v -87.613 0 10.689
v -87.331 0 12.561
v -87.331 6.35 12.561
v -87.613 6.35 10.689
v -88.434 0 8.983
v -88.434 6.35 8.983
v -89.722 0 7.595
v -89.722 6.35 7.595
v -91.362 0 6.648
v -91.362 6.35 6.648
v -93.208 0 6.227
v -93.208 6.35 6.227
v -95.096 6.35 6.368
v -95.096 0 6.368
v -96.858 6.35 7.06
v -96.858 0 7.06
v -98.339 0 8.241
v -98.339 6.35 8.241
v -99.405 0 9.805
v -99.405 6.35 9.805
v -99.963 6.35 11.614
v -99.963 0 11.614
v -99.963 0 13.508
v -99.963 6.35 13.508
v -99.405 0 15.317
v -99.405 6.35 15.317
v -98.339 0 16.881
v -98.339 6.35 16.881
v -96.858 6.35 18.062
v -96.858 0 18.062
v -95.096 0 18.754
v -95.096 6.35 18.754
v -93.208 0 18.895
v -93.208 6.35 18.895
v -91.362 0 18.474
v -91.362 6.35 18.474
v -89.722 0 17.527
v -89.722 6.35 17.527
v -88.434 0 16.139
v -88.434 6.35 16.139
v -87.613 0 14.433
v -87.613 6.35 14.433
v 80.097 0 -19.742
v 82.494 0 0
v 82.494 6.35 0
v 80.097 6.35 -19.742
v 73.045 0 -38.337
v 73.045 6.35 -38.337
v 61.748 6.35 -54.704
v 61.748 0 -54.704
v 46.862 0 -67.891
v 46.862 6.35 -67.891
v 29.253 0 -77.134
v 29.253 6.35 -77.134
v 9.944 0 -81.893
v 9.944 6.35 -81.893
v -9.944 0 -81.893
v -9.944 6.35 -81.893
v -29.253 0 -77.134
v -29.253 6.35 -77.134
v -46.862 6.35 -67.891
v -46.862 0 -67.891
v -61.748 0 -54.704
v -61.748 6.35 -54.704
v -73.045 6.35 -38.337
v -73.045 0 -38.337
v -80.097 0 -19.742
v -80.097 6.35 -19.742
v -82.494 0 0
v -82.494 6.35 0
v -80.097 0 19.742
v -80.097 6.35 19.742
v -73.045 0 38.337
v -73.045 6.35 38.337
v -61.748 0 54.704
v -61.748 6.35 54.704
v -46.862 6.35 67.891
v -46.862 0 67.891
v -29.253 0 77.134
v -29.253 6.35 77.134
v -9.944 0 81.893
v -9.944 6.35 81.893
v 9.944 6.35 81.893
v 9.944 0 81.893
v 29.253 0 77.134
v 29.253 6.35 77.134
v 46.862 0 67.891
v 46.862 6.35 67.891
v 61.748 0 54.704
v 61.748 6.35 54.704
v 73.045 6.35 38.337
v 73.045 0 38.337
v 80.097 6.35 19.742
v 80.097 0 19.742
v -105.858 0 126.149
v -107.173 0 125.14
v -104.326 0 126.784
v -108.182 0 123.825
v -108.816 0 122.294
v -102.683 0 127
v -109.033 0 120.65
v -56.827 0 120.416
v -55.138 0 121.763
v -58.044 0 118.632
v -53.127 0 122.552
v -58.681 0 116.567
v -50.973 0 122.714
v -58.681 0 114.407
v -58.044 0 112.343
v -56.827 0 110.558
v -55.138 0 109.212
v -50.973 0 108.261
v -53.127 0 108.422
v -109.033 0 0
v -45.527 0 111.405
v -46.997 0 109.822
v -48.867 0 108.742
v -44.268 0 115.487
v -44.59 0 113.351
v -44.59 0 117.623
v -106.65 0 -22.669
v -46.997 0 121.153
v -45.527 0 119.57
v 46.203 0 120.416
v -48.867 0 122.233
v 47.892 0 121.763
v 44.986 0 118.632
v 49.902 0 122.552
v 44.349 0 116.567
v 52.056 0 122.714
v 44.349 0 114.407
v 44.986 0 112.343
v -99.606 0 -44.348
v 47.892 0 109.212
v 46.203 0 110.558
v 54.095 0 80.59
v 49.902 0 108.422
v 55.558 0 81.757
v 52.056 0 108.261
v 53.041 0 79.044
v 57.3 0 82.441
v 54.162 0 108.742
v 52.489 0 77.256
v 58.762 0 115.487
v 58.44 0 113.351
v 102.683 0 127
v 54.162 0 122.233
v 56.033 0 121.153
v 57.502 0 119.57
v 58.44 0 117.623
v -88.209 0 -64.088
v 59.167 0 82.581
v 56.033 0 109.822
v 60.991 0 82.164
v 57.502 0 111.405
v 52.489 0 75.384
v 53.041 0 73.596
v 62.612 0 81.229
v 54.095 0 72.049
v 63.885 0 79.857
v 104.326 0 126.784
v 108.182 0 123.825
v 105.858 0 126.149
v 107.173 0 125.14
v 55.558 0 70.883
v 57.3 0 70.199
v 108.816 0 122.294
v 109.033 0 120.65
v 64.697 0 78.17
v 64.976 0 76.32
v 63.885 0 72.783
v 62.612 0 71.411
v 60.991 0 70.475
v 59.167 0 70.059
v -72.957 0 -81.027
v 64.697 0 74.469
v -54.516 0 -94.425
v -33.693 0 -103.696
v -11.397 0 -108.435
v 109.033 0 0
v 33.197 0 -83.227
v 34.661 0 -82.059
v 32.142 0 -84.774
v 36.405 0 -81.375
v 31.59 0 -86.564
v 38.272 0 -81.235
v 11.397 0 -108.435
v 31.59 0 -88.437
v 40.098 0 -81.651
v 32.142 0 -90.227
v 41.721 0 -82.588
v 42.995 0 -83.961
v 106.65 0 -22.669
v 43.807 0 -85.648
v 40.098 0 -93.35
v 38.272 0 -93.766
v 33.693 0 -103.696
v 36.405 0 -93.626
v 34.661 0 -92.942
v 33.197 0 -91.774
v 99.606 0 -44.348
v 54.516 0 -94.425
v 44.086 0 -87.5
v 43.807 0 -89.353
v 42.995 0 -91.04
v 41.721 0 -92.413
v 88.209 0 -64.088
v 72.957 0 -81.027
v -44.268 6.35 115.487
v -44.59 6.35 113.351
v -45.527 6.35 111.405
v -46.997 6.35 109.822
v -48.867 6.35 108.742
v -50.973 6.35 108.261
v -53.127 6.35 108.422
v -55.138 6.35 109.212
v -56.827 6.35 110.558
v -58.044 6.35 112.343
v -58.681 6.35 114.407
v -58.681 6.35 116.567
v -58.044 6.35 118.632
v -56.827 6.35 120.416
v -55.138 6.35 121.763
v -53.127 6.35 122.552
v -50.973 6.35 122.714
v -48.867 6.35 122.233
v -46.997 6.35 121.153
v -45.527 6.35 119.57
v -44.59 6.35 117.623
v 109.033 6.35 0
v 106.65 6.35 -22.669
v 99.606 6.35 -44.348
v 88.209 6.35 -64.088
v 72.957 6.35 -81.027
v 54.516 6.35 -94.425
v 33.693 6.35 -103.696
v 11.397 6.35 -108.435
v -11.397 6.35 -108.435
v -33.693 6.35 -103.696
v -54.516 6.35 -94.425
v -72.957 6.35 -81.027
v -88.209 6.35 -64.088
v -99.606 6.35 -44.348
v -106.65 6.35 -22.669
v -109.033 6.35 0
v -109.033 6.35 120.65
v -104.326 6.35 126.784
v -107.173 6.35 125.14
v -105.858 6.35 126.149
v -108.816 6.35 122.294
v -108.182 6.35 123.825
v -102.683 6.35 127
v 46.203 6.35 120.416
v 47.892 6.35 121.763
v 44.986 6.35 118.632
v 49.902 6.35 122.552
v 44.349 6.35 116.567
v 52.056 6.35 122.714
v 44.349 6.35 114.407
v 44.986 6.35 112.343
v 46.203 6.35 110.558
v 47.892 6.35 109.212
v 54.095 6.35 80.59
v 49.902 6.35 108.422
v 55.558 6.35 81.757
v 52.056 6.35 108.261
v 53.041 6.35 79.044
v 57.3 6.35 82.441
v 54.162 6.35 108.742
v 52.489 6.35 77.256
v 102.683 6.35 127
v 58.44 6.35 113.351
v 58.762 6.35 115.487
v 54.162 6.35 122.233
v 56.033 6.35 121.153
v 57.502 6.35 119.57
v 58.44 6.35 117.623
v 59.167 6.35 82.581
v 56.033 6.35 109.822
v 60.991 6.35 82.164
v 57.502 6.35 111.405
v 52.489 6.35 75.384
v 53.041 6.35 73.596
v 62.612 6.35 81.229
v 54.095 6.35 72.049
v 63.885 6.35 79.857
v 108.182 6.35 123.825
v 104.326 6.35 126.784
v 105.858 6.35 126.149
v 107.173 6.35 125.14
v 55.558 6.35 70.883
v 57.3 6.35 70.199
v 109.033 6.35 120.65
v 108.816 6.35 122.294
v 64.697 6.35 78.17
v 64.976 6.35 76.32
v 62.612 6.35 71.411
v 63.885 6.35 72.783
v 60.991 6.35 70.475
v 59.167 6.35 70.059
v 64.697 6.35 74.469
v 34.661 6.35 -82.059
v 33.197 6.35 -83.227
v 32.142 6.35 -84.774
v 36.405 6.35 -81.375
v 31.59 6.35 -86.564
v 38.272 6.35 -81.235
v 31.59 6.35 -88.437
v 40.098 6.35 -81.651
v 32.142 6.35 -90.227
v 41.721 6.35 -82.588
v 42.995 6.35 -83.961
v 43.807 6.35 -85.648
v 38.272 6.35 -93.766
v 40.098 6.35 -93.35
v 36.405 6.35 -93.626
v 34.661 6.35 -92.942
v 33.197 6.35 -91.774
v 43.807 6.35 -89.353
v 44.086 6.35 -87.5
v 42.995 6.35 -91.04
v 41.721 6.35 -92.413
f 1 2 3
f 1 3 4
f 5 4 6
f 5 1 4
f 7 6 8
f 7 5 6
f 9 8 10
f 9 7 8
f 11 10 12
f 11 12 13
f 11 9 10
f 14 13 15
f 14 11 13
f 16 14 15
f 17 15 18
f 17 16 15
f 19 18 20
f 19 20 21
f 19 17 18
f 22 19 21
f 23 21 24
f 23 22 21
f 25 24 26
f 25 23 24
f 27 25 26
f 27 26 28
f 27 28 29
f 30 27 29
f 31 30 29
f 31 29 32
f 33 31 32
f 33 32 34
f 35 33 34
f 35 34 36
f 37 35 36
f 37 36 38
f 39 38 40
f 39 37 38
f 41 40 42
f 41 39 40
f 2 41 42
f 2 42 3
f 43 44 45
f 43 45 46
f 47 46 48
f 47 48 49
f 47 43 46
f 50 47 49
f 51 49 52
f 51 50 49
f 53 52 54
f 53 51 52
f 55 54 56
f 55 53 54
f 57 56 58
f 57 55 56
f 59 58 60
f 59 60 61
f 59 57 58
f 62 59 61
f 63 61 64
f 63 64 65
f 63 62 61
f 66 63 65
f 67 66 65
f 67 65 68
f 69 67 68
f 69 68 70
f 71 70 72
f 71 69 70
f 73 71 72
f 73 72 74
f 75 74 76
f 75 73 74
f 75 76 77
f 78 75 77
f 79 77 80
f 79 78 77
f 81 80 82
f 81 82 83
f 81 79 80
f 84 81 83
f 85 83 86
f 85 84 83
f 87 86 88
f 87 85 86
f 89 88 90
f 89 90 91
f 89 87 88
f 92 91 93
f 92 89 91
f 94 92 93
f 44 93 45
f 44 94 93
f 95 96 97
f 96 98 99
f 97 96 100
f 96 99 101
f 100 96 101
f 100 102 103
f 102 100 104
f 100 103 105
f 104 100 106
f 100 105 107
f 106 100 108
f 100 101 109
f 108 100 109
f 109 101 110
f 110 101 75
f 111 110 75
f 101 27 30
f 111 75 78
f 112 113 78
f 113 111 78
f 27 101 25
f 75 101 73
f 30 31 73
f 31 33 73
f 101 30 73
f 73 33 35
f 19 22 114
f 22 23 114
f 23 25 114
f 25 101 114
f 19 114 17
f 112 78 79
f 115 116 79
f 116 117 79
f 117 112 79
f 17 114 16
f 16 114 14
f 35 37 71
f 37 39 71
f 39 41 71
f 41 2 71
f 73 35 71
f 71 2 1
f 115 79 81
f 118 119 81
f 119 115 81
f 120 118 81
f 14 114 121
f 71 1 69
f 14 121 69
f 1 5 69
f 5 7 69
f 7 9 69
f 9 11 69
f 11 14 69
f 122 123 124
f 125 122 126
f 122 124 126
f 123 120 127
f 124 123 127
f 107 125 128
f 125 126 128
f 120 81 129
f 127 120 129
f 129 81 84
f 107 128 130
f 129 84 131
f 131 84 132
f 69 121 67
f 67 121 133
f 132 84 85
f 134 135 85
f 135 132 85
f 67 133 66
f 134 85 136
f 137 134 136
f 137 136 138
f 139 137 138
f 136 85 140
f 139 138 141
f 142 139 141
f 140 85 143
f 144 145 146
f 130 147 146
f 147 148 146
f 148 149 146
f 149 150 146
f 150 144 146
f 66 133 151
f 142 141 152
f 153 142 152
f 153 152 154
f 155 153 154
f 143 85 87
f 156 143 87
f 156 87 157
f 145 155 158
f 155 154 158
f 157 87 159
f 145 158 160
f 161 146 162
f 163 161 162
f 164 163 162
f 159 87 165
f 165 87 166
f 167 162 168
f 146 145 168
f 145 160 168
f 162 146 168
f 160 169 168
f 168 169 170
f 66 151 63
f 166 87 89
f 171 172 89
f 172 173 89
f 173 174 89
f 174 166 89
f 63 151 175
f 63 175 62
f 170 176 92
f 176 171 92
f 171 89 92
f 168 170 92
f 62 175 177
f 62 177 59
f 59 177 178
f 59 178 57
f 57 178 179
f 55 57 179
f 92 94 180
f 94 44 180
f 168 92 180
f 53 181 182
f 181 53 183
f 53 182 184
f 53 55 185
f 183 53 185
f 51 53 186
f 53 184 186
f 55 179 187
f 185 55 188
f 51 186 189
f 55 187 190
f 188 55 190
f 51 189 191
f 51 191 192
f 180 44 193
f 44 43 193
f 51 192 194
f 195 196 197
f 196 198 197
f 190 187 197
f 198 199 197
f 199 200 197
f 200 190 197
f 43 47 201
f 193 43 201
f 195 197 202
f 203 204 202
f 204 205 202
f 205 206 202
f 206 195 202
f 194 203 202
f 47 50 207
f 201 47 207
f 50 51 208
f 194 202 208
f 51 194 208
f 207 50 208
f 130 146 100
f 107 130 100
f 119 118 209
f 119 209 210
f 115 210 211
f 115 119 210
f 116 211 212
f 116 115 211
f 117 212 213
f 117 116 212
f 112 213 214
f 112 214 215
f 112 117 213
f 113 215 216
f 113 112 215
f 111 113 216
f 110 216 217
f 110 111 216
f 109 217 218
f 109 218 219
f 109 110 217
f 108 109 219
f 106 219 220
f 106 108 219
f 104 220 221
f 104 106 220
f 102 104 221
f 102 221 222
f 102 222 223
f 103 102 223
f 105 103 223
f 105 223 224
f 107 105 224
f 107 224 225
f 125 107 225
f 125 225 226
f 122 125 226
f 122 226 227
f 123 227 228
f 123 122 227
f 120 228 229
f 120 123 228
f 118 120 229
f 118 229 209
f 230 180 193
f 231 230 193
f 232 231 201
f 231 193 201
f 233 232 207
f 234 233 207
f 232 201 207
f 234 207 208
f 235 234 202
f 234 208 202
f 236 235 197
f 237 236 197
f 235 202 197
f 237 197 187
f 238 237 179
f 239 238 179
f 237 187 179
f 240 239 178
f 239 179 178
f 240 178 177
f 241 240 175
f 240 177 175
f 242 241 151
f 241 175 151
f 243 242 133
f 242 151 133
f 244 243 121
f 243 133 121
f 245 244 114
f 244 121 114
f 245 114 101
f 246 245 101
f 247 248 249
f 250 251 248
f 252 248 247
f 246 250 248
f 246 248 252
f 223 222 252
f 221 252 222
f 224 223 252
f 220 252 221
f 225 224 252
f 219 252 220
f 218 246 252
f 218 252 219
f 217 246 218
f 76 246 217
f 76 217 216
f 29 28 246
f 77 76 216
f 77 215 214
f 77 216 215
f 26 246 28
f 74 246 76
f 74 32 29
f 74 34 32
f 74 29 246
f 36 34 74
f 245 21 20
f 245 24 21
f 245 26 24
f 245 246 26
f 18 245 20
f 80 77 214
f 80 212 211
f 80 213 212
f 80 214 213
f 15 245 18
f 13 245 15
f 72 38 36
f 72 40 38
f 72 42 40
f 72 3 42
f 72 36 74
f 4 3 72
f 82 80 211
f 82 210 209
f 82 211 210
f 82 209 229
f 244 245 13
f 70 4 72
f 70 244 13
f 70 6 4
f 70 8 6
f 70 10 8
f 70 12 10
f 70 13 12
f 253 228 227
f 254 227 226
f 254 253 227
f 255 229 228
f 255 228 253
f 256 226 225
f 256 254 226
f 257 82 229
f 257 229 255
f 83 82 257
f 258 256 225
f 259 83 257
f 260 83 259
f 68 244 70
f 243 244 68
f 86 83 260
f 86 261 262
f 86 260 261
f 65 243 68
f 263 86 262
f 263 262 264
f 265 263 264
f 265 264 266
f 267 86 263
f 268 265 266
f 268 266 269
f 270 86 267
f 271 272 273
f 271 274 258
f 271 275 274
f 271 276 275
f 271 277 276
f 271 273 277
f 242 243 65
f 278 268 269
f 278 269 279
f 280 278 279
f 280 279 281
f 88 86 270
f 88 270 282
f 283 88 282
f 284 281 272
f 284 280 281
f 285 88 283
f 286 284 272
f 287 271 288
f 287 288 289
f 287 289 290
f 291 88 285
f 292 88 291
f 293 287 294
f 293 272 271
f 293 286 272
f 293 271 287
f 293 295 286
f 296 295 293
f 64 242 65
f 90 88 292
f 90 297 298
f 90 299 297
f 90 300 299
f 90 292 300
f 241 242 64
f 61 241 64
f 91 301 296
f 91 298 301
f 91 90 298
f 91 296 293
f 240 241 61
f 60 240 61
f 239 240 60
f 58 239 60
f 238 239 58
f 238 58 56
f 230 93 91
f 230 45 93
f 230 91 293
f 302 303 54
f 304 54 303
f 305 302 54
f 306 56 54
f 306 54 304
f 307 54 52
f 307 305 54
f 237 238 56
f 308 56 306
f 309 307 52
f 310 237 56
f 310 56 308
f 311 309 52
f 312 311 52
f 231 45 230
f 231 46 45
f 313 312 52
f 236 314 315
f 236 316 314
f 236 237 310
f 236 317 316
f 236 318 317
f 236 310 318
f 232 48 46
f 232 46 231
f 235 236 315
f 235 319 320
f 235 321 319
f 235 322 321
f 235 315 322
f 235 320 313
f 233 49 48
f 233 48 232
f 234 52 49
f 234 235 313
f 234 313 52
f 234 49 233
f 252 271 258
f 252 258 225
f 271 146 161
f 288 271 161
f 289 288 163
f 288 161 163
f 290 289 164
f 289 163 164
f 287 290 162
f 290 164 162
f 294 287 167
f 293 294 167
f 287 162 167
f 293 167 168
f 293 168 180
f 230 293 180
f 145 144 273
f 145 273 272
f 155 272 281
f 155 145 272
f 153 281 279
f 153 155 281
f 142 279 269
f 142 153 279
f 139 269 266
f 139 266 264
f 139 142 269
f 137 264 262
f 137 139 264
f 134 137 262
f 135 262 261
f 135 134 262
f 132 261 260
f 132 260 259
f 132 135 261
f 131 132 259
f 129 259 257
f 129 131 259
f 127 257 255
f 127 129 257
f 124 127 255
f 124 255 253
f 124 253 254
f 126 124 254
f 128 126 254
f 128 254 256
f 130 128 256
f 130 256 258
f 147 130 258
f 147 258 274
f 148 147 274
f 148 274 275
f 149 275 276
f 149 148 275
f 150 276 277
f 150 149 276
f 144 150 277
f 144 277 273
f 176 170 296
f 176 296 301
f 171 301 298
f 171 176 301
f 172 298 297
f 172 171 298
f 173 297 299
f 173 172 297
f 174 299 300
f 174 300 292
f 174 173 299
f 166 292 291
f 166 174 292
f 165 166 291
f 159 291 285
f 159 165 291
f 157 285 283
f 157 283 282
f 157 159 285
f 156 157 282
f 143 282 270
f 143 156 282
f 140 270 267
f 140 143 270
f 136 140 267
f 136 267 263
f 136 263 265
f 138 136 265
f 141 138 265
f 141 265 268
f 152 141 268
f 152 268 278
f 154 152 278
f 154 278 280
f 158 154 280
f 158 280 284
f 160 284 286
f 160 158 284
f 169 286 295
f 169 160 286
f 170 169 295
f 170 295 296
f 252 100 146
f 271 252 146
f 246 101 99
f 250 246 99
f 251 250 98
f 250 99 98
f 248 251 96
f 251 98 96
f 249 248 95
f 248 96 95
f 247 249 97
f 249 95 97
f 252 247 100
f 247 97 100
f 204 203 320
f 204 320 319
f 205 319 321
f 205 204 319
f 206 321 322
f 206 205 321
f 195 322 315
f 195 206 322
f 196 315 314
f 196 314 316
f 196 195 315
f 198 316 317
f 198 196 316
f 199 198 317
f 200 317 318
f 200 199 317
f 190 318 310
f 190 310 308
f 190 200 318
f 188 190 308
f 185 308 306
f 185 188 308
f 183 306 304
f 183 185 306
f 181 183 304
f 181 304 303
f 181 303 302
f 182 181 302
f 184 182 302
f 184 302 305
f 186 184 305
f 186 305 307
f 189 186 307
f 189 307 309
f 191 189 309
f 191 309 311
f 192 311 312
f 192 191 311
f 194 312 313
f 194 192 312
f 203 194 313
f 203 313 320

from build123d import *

# Parameters (mm, degrees)
SKETCH4_R           = 82.49431047
SKETCH4_R_2         = 7.246642198
SKETCH4_R_3         = 6.35187519
SKETCH4_R_4         = 6.283502274
SKETCH4_R_5         = 6.278398691
BOSS_EXTRUDE1_DEPTH = 6.35


with BuildPart() as part:
    # Sketch4 → Boss-Extrude1 (new body)
    with BuildSketch(Plane(origin=(0, 0, 0), x_dir=(1, 0, 0), z_dir=(0, 1, 0))):
        with BuildLine():
            Line((-102.682677734, -127), (102.682677734, -127))
            ThreePointArc((102.682677734, -127), (107.172805794, -125.140128061), (109.032677734, -120.65))
            Line((109.032677734, -120.65), (109.032677734, 0))
            ThreePointArc((109.032677734, 0), (0, 109.032677734), (-109.032677734, 0))
            Line((-109.032677734, 0), (-109.032677734, -120.65))
            ThreePointArc((-109.032677734, -120.65), (-107.172805794, -125.140128061), (-102.682677734, -127))
        make_face()
        Circle(SKETCH4_R, mode=Mode.SUBTRACT)
        with Locations((-51.514938753, -115.487351309)):
            Circle(SKETCH4_R_2, mode=Mode.SUBTRACT)
        with Locations((51.514938753, -115.487351309)):
            Circle(SKETCH4_R_2, mode=Mode.SUBTRACT)
        with Locations((-93.682436309, -12.561067561)):
            Circle(SKETCH4_R_3, mode=Mode.SUBTRACT)
        with Locations((37.802843995, 87.500493595)):
            Circle(SKETCH4_R_4, mode=Mode.SUBTRACT)
        with Locations((58.697357769, -76.319875304)):
            Circle(SKETCH4_R_5, mode=Mode.SUBTRACT)
    extrude(amount=BOSS_EXTRUDE1_DEPTH)


solid = part.part
